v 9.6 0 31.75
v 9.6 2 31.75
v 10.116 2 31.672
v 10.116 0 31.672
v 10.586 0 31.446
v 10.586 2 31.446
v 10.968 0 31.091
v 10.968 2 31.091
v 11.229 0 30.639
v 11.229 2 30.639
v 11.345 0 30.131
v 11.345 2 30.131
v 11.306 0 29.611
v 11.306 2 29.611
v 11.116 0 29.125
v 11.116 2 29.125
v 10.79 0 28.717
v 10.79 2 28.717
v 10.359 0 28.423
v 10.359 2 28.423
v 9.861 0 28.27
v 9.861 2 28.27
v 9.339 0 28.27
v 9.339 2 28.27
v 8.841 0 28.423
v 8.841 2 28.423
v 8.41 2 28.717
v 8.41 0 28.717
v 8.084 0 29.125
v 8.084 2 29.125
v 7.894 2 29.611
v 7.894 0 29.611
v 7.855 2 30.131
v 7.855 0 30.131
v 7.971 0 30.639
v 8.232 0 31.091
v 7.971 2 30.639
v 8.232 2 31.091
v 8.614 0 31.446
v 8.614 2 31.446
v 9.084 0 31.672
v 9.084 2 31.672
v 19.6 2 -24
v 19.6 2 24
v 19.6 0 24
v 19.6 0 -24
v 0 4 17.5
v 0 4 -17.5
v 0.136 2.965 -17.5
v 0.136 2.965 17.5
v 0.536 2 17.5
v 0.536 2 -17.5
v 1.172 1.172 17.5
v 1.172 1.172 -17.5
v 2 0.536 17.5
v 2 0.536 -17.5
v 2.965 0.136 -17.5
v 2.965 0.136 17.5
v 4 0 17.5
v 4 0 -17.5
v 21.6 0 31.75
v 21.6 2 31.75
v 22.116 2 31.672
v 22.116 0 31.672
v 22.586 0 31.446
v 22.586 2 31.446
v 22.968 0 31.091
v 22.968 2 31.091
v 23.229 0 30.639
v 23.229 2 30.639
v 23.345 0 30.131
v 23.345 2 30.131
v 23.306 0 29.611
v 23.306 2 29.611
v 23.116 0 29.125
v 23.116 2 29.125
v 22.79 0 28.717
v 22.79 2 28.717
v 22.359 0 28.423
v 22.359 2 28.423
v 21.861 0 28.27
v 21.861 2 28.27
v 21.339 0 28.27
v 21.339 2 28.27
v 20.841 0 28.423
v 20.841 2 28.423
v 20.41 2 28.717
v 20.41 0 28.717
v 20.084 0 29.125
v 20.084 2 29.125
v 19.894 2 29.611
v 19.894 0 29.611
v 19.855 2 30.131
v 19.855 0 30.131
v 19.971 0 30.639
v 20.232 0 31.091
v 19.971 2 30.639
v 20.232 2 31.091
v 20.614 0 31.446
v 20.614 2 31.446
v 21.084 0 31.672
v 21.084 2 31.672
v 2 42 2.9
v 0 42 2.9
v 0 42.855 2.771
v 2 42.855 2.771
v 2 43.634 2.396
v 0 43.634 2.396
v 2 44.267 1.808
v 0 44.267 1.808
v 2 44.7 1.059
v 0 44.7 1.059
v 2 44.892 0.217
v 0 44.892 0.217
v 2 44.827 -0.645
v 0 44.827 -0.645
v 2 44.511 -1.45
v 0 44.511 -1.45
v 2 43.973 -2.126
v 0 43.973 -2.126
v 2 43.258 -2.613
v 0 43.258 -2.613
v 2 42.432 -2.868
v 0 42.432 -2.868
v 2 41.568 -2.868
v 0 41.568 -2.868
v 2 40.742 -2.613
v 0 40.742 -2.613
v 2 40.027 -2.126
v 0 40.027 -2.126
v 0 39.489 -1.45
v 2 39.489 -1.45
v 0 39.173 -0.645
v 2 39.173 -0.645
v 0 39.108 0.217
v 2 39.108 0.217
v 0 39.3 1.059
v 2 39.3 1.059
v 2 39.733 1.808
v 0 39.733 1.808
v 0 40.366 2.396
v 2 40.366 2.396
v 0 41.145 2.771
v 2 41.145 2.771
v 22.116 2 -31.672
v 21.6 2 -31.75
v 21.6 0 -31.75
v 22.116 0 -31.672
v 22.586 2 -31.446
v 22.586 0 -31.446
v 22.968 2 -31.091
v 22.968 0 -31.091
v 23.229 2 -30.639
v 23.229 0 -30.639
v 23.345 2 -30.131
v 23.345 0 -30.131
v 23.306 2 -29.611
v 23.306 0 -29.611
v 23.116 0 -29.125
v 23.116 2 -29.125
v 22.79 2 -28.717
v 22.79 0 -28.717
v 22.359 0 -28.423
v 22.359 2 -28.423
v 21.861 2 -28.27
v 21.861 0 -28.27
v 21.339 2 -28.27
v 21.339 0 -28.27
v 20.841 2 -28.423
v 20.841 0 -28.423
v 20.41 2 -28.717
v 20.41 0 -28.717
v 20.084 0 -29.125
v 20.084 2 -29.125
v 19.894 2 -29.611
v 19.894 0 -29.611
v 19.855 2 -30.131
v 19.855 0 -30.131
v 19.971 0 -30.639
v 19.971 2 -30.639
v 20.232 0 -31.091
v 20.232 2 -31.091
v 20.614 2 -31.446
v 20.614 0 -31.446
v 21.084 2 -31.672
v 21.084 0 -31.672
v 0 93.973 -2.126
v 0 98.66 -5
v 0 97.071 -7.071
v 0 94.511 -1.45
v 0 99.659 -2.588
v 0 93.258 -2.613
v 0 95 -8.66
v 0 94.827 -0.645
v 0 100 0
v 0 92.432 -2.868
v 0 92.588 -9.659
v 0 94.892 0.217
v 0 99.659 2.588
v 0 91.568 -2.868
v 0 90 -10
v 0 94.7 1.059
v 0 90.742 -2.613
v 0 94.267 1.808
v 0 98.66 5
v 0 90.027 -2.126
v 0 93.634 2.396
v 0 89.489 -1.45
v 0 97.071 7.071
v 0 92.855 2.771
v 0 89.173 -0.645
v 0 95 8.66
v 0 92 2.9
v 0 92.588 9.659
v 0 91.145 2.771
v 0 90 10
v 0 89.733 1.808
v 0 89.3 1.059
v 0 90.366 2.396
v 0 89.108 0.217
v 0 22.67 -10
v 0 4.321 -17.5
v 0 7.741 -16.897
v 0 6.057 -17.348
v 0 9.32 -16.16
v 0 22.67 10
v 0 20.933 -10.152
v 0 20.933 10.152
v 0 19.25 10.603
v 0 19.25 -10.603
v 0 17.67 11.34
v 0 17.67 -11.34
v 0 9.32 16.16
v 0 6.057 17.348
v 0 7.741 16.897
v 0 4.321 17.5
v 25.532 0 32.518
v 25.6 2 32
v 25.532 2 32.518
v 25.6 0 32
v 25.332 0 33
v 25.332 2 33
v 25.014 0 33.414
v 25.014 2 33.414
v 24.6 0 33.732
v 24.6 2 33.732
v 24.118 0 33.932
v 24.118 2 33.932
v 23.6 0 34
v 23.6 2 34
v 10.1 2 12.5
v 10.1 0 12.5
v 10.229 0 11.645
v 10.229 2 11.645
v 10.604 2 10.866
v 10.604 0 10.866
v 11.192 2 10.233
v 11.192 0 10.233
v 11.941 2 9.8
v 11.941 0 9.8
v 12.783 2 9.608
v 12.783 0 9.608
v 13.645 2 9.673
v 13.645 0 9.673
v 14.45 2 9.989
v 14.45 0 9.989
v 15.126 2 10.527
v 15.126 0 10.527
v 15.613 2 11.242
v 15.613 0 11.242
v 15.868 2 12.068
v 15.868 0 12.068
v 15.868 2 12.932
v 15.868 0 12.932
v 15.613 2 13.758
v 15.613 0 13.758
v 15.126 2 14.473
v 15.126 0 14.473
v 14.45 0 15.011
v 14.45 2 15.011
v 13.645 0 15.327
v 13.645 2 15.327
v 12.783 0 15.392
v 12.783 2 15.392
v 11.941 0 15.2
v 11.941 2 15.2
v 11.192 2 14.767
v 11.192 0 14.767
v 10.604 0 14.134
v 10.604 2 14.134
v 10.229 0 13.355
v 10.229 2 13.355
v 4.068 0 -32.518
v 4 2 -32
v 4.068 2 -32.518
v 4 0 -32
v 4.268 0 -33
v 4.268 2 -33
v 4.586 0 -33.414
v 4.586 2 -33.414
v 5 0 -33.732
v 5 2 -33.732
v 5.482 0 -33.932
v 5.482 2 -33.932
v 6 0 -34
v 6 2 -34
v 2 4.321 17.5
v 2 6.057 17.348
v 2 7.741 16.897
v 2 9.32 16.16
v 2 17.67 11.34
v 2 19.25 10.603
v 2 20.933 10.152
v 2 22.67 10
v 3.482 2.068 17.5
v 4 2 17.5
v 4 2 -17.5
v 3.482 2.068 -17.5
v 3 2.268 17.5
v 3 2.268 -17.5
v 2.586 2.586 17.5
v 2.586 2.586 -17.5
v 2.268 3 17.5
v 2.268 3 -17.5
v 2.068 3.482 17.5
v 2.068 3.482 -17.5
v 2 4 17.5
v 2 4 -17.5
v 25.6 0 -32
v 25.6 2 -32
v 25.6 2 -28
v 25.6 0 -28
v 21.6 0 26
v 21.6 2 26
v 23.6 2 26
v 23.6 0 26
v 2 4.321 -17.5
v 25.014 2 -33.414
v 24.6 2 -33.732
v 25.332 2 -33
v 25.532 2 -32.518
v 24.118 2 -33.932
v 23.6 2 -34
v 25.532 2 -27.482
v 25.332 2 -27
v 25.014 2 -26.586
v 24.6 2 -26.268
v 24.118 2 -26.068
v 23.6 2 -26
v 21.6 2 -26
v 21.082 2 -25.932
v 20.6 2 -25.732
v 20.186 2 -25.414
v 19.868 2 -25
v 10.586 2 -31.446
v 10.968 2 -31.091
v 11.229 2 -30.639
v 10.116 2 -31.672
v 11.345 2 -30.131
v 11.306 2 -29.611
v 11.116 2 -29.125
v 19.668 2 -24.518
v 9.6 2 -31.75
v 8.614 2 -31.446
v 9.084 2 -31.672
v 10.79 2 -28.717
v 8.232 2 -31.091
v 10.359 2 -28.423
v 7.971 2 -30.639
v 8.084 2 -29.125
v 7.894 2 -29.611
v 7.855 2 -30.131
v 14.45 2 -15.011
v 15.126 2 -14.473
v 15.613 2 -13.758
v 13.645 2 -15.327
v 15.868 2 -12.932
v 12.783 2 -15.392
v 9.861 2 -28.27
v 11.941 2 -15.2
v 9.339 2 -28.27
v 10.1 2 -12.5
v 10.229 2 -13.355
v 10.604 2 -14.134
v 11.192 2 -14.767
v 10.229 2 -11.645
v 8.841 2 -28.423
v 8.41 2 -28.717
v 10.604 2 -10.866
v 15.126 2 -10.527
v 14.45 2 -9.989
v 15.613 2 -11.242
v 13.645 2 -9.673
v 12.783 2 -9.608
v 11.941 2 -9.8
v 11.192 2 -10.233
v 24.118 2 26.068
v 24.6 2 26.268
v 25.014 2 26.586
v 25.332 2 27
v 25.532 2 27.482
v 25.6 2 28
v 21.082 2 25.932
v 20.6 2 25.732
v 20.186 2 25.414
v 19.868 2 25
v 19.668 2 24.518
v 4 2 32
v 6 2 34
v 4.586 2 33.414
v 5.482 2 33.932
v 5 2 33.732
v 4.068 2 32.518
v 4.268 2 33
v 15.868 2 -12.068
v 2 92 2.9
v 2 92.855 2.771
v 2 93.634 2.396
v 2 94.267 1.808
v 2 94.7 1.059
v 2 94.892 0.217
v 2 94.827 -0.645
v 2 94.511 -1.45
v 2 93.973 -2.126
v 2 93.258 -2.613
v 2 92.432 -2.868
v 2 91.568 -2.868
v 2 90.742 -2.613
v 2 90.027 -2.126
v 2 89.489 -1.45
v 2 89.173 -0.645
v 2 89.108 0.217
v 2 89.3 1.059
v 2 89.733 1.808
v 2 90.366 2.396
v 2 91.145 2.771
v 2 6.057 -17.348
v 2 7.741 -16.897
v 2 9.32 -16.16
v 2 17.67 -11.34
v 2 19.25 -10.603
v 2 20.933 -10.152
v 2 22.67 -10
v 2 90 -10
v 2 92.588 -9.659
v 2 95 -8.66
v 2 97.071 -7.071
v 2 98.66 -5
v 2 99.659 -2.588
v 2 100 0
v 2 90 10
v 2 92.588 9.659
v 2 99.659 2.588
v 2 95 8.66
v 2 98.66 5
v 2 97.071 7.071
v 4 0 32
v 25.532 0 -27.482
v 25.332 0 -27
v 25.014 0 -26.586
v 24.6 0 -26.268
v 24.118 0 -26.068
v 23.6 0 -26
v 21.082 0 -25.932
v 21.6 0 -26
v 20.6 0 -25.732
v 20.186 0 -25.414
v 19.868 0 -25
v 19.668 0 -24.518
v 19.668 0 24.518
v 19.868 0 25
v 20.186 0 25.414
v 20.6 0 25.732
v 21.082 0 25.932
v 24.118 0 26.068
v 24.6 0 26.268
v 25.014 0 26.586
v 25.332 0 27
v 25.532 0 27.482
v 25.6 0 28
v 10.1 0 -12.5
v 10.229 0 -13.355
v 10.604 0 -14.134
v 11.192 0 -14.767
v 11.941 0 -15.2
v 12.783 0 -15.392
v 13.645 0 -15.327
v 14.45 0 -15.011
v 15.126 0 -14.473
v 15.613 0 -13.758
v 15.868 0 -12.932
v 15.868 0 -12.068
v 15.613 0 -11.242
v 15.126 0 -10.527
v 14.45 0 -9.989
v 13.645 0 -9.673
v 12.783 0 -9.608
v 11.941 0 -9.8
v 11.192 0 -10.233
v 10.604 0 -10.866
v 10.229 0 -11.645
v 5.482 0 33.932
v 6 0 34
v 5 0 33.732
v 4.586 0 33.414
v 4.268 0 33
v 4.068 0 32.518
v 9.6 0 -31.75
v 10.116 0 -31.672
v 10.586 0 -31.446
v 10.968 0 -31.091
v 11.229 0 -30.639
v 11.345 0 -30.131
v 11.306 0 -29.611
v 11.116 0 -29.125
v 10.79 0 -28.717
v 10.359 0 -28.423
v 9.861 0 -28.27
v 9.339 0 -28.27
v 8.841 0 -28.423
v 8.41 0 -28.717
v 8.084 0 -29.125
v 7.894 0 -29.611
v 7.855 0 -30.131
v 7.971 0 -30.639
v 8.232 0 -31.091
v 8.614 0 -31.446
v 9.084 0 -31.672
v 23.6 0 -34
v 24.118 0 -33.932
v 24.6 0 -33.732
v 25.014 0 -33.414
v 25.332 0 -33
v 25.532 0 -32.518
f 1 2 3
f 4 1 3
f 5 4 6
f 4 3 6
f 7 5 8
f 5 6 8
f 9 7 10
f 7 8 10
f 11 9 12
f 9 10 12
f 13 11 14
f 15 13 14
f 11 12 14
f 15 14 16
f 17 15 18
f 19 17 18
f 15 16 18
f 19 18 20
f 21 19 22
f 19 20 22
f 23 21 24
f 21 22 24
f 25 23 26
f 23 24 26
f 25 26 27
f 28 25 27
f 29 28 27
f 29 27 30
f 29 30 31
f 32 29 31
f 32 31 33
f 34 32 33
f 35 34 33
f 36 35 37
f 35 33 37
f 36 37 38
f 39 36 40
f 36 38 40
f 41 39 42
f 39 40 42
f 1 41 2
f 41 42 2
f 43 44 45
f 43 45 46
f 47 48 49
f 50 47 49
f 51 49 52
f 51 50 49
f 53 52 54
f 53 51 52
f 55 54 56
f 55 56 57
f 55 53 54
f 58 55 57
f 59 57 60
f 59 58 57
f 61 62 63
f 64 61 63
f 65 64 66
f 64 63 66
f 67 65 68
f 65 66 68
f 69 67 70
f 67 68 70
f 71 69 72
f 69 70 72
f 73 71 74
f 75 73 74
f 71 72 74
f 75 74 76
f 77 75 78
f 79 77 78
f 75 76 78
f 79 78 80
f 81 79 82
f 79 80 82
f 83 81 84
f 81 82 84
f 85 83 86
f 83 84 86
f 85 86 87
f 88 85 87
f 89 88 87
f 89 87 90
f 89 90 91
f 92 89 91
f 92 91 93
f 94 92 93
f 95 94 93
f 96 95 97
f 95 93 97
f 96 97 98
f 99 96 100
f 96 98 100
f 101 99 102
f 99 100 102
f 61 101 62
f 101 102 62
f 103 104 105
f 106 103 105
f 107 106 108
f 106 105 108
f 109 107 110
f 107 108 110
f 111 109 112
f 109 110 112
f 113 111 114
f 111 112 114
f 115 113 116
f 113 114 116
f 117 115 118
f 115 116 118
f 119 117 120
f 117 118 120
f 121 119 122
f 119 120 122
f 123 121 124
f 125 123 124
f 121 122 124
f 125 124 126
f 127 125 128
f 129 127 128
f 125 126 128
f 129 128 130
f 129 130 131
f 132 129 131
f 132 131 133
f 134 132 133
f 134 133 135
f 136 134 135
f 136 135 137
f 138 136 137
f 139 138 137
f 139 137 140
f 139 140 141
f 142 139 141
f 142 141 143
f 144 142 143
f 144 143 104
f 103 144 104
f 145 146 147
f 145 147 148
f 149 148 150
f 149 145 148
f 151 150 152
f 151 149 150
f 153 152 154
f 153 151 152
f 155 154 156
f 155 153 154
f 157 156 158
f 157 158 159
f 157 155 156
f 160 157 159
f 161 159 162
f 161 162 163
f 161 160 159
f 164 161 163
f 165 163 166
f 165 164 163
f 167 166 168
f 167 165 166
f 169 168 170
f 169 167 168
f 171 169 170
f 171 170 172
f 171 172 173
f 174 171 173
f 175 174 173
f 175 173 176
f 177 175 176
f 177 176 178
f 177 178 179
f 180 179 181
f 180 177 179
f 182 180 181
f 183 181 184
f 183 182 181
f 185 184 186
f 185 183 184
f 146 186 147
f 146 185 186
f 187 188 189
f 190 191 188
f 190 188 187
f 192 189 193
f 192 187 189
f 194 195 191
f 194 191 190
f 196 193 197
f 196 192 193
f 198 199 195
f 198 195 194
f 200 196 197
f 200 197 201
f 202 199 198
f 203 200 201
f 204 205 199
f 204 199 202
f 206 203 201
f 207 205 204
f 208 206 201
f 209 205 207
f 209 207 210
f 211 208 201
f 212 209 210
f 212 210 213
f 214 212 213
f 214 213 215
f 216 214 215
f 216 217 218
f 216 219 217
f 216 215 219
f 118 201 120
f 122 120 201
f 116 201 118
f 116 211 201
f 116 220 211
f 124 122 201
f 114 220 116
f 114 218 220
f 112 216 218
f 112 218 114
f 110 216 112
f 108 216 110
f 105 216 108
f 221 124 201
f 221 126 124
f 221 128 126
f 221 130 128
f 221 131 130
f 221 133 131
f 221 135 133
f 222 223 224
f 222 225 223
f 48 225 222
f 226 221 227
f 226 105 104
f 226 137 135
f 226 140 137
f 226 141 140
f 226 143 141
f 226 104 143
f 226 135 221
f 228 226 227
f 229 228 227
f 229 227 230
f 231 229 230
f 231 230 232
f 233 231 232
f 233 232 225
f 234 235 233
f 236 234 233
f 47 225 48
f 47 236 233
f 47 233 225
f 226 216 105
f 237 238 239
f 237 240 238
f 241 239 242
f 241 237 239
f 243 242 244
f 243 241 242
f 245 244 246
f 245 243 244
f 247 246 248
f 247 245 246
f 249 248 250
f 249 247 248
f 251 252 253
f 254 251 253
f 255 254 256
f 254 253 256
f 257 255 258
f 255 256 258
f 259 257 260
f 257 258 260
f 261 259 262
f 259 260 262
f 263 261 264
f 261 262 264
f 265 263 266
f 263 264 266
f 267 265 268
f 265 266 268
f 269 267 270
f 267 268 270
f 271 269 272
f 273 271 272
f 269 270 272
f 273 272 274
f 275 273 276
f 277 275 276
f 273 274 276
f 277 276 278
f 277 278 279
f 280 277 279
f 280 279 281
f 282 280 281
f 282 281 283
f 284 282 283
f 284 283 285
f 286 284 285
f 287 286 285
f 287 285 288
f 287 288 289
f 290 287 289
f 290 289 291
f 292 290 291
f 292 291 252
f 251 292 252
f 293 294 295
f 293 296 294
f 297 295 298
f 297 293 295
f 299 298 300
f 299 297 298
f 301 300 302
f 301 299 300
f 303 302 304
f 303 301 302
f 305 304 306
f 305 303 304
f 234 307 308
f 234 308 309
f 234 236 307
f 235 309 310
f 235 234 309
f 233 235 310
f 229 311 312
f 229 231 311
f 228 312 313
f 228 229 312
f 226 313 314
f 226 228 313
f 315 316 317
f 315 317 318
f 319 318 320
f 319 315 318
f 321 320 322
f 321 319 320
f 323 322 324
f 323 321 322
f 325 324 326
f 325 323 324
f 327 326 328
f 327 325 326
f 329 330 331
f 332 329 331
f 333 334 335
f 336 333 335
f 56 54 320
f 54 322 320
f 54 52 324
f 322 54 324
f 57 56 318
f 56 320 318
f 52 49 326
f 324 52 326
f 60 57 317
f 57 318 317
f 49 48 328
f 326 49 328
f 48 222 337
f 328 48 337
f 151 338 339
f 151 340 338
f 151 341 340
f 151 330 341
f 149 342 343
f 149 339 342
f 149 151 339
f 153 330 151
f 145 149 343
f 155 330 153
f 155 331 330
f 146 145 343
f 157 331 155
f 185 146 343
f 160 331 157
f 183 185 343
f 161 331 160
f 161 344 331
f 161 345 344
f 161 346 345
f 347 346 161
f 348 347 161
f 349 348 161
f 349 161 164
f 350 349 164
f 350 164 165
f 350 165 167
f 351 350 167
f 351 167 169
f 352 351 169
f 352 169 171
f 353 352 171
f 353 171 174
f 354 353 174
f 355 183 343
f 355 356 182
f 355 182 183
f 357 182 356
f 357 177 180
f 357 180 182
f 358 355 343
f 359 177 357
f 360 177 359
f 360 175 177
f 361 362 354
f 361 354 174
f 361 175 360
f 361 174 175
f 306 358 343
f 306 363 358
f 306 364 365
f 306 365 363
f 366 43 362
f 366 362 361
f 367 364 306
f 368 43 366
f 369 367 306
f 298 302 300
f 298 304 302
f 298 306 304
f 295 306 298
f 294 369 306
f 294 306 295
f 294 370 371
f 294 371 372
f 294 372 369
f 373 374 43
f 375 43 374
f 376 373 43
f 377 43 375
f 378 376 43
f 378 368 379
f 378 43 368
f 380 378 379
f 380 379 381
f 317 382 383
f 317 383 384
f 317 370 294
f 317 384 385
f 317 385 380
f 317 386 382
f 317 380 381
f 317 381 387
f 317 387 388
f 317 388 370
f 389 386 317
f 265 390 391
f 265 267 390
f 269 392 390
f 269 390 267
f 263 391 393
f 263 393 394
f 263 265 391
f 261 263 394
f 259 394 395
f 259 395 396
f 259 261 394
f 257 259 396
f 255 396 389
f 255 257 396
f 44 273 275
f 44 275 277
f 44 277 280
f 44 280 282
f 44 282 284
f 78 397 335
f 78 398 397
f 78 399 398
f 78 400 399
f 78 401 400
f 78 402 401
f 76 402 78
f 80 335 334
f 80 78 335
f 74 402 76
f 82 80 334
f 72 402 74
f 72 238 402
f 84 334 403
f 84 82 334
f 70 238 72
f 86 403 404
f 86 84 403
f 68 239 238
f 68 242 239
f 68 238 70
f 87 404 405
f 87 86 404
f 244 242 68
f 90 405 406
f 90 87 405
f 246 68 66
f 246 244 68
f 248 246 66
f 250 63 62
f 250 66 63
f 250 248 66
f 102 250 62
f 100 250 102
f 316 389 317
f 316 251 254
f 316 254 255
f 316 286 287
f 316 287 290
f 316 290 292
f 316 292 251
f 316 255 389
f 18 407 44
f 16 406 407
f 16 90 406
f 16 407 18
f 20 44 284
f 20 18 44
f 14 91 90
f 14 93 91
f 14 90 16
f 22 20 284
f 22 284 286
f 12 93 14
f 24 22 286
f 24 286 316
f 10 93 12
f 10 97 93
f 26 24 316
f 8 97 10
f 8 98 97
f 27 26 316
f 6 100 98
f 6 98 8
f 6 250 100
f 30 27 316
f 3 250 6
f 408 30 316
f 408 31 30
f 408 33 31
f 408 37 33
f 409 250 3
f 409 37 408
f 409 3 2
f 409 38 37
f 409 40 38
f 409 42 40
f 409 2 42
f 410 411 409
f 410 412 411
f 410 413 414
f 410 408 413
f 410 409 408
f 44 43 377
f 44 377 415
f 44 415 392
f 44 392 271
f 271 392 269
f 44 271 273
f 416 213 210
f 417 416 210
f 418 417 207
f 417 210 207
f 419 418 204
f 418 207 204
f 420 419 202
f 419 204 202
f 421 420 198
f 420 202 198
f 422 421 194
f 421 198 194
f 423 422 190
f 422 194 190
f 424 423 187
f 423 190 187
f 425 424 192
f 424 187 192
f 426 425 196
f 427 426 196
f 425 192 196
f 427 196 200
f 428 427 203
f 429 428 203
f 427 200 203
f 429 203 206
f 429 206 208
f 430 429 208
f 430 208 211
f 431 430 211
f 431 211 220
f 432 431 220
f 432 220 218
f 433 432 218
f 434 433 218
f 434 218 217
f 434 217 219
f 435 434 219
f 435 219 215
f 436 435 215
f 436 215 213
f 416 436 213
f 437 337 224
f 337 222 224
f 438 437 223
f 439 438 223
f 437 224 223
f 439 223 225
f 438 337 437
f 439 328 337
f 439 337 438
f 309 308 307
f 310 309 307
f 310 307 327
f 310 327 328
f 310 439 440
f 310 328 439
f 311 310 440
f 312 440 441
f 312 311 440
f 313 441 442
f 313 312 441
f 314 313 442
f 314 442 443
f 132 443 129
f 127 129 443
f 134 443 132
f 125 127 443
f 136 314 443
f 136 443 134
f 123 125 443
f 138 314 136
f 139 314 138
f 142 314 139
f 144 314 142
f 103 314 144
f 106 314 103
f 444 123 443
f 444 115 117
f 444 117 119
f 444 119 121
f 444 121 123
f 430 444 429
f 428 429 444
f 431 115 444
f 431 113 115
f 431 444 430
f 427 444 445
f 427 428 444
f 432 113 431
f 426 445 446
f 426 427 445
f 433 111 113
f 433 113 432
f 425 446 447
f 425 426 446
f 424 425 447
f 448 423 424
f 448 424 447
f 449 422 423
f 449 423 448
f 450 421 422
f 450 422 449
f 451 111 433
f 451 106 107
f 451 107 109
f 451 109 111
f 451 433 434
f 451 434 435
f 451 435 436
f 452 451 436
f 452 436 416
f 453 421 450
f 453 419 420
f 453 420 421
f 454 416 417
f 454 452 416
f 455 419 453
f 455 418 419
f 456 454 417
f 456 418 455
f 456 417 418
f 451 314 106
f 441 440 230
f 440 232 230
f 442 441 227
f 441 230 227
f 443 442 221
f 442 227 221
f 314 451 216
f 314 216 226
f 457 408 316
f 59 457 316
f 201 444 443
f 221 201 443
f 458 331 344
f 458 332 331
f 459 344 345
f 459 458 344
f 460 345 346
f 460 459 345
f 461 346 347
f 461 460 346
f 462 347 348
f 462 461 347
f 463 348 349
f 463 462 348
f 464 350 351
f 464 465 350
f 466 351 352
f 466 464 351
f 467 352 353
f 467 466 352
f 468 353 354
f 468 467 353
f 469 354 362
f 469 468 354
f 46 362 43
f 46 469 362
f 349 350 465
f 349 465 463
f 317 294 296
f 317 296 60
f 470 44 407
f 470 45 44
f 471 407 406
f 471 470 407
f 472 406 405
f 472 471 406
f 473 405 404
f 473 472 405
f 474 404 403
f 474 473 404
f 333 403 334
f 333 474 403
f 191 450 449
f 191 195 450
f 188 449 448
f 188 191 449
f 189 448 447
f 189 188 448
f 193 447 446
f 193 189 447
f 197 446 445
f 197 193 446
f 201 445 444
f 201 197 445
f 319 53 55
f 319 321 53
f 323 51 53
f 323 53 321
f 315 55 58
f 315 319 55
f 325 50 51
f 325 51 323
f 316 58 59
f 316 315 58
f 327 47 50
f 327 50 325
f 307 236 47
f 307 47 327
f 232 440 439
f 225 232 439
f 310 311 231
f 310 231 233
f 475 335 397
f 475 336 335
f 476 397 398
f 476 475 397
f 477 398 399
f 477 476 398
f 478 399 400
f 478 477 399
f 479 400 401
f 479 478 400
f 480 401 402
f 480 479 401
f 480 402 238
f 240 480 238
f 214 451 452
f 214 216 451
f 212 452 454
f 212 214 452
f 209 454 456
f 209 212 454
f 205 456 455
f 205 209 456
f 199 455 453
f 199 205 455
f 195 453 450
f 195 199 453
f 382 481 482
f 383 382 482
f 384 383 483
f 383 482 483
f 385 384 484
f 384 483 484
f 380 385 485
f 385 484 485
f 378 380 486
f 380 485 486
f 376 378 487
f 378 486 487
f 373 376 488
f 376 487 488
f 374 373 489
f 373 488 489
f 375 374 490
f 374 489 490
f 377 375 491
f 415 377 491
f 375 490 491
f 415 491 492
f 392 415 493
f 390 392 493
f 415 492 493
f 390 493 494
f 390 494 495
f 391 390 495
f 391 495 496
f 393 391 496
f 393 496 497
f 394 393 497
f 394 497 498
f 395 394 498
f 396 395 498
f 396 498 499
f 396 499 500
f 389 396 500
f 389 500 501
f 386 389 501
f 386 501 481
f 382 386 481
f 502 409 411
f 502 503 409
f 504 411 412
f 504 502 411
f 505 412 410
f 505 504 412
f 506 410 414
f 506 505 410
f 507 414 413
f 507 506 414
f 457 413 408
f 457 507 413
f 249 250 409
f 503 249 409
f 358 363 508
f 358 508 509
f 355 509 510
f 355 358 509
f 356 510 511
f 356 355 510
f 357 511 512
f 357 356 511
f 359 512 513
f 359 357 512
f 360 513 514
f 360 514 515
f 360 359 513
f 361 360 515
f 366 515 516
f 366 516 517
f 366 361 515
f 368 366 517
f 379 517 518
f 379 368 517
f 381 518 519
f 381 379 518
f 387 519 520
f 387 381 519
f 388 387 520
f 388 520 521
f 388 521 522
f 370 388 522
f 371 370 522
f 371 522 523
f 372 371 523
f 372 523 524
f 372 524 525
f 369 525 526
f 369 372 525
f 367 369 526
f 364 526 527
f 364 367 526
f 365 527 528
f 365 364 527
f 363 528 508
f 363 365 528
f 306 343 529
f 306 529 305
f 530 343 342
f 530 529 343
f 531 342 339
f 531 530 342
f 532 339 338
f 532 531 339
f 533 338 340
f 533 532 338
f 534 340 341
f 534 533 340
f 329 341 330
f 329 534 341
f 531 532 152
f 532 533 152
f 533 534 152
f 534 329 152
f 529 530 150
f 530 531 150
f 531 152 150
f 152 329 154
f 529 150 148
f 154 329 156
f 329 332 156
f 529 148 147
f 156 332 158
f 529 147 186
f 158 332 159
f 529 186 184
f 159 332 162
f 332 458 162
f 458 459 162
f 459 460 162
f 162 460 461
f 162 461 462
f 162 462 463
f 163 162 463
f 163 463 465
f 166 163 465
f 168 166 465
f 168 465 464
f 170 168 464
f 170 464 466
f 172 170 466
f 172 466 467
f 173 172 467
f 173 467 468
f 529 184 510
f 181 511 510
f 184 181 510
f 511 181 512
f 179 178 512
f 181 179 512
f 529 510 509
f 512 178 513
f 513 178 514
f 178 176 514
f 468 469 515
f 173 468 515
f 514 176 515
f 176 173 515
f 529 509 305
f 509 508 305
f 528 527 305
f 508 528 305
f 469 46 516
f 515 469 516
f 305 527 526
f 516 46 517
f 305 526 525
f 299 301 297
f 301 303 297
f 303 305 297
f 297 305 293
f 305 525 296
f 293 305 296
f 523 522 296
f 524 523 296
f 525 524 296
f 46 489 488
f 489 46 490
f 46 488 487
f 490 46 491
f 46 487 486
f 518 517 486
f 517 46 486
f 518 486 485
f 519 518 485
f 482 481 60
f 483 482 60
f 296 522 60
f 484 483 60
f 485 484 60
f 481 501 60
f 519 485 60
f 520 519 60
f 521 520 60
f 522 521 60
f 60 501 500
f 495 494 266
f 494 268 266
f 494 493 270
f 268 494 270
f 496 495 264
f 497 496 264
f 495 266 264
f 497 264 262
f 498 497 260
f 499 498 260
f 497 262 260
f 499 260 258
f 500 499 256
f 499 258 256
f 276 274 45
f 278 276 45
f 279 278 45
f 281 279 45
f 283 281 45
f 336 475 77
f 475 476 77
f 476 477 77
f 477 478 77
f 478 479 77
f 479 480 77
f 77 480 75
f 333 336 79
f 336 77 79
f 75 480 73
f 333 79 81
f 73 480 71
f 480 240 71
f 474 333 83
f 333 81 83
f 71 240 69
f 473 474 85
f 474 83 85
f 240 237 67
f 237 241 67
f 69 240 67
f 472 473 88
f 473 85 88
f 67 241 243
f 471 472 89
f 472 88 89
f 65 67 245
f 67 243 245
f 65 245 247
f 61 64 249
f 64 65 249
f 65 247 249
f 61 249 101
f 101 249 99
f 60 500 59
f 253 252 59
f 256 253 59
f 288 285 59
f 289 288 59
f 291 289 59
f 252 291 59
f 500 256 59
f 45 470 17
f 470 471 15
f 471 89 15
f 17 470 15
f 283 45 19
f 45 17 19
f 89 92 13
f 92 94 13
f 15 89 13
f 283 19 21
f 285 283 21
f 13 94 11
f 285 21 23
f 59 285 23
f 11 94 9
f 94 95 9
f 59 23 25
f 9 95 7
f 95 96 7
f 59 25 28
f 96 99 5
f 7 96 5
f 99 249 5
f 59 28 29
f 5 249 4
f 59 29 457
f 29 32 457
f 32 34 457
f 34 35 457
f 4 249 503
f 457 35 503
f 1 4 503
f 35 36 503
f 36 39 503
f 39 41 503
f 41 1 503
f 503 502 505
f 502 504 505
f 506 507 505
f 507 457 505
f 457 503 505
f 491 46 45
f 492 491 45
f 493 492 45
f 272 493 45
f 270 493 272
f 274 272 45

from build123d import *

# Parameters (mm, degrees)
BASE_FLANGE1_DEPTH   = 17.5
M5_CLEARANCE_HOLE2_D = 5.8
M5_CLEARANCE_HOLE1_D = 5.8
CUT_EXTRUDE3_DEPTH   = 2
SKETCH21_R           = 1.75
BOSS_EXTRUDE1_DEPTH  = 2
SKETCH22_W           = 6
SKETCH22_H           = 52
CUT_EXTRUDE4_DEPTH   = 10
FILLET1_R            = 2
FILLET2_R            = 10


# Sheet-metal steps are written as plain solids
with BuildPart() as part:
    # Sketch1 → Base-Flange1 (new, symmetric)
    with BuildSketch(Plane.XY):
        with BuildLine():
            Line((0, 100), (0, 4))
            ThreePointArc((0, 4), (1.171572875, 1.171572875), (4, 0))
            Line((4, 0), (19, 0))
            Line((19, 0), (19, 2))
            Line((19, 2), (4, 2))
            ThreePointArc((4, 2), (2.585786438, 2.585786438), (2, 4))
            Line((2, 4), (2, 100))
            Line((2, 100), (0, 100))
        make_face()
    extrude(amount=BASE_FLANGE1_DEPTH, both=True)

    # M5 Clearance Hole2 (through all)
    with Locations(Plane(origin=(0, 2, 0), x_dir=(1, 0, 0), z_dir=(0, 1, 0))):
        with Locations((13, -12.5), (13, 12.5)):
            Hole(M5_CLEARANCE_HOLE2_D / 2)

    # M5 Clearance Hole1 (through all)
    with Locations(Plane(origin=(2, 0, 0), x_dir=(0, 0, -1), z_dir=(1, 0, 0))):
        with Locations((0, 92), (0, 42)):
            Hole(M5_CLEARANCE_HOLE1_D / 2)

    # Sketch20 → Cut-Extrude3 (cut)
    with BuildSketch(Plane(origin=(2, 0, 0), x_dir=(0, 0, -1), z_dir=(1, 0, 0))):
        Polygon((-10, 100), (-10, 19.990381057), (-17.5, 7), (-17.5, 100), align=None)
    cut_extrude3 = extrude(amount=-CUT_EXTRUDE3_DEPTH, mode=Mode.SUBTRACT)

    # Mirror1: Cut-Extrude3 across plane
    add(cut_extrude3.mirror(Plane.XY), mode=Mode.SUBTRACT)

    # Sketch21 → Boss-Extrude1 (add)
    with BuildSketch(Plane(origin=(0, 2, 0), x_dir=(1, 0, 0), z_dir=(0, 1, 0))):
        Polygon((4, -17.5), (19, -17.5), (19, 0), (25.6, 0), (25.6, -17.5), (25.6, -34), (4, -34), align=None)
        with Locations(Location((9.6, -30, 0), (0, 0, 270))):
            Circle(SKETCH21_R, mode=Mode.SUBTRACT)
        with Locations(Location((21.6, -30, 0), (0, 0, 270))):
            Circle(SKETCH21_R, mode=Mode.SUBTRACT)
    boss_extrude1 = extrude(amount=-BOSS_EXTRUDE1_DEPTH)

    # Mirror2: Boss-Extrude1 across plane
    add(boss_extrude1.mirror(Plane.XY))

    # Sketch22 → Cut-Extrude4 (cut)
    with BuildSketch(Plane(origin=(0, 2, 0), x_dir=(1, 0, 0), z_dir=(0, 1, 0))):
        with Locations((22.6, 0)):
            Rectangle(SKETCH22_W, SKETCH22_H)
    extrude(amount=-CUT_EXTRUDE4_DEPTH, mode=Mode.SUBTRACT)

    # Fillet1
    fillet1_edges = [part.edges().sort_by_distance(p)[0] for p in [
        (4, 1, 34),
        (25.6, 1, 34),
        (4, 1, -34),
        (25.6, 1, -34),
        (25.6, 1, -26),
        (25.6, 1, 26),
        (19.6, 1, 26),
        (19.6, 1, -26),
    ]]
    fillet(fillet1_edges, radius=FILLET1_R)

    # Fillet2
    fillet2_edges = [part.edges().sort_by_distance(p)[0] for p in [
        (1, 7, 17.5),
        (1, 7, -17.5),
        (1, 19.990381057, 10),
        (1, 19.990381057, -10),
        (1, 100, 10),
        (1, 100, -10),
    ]]
    fillet(fillet2_edges, radius=FILLET2_R - 0.0001)  # a hair under: the kernel refuses the full size


solid = part.part
